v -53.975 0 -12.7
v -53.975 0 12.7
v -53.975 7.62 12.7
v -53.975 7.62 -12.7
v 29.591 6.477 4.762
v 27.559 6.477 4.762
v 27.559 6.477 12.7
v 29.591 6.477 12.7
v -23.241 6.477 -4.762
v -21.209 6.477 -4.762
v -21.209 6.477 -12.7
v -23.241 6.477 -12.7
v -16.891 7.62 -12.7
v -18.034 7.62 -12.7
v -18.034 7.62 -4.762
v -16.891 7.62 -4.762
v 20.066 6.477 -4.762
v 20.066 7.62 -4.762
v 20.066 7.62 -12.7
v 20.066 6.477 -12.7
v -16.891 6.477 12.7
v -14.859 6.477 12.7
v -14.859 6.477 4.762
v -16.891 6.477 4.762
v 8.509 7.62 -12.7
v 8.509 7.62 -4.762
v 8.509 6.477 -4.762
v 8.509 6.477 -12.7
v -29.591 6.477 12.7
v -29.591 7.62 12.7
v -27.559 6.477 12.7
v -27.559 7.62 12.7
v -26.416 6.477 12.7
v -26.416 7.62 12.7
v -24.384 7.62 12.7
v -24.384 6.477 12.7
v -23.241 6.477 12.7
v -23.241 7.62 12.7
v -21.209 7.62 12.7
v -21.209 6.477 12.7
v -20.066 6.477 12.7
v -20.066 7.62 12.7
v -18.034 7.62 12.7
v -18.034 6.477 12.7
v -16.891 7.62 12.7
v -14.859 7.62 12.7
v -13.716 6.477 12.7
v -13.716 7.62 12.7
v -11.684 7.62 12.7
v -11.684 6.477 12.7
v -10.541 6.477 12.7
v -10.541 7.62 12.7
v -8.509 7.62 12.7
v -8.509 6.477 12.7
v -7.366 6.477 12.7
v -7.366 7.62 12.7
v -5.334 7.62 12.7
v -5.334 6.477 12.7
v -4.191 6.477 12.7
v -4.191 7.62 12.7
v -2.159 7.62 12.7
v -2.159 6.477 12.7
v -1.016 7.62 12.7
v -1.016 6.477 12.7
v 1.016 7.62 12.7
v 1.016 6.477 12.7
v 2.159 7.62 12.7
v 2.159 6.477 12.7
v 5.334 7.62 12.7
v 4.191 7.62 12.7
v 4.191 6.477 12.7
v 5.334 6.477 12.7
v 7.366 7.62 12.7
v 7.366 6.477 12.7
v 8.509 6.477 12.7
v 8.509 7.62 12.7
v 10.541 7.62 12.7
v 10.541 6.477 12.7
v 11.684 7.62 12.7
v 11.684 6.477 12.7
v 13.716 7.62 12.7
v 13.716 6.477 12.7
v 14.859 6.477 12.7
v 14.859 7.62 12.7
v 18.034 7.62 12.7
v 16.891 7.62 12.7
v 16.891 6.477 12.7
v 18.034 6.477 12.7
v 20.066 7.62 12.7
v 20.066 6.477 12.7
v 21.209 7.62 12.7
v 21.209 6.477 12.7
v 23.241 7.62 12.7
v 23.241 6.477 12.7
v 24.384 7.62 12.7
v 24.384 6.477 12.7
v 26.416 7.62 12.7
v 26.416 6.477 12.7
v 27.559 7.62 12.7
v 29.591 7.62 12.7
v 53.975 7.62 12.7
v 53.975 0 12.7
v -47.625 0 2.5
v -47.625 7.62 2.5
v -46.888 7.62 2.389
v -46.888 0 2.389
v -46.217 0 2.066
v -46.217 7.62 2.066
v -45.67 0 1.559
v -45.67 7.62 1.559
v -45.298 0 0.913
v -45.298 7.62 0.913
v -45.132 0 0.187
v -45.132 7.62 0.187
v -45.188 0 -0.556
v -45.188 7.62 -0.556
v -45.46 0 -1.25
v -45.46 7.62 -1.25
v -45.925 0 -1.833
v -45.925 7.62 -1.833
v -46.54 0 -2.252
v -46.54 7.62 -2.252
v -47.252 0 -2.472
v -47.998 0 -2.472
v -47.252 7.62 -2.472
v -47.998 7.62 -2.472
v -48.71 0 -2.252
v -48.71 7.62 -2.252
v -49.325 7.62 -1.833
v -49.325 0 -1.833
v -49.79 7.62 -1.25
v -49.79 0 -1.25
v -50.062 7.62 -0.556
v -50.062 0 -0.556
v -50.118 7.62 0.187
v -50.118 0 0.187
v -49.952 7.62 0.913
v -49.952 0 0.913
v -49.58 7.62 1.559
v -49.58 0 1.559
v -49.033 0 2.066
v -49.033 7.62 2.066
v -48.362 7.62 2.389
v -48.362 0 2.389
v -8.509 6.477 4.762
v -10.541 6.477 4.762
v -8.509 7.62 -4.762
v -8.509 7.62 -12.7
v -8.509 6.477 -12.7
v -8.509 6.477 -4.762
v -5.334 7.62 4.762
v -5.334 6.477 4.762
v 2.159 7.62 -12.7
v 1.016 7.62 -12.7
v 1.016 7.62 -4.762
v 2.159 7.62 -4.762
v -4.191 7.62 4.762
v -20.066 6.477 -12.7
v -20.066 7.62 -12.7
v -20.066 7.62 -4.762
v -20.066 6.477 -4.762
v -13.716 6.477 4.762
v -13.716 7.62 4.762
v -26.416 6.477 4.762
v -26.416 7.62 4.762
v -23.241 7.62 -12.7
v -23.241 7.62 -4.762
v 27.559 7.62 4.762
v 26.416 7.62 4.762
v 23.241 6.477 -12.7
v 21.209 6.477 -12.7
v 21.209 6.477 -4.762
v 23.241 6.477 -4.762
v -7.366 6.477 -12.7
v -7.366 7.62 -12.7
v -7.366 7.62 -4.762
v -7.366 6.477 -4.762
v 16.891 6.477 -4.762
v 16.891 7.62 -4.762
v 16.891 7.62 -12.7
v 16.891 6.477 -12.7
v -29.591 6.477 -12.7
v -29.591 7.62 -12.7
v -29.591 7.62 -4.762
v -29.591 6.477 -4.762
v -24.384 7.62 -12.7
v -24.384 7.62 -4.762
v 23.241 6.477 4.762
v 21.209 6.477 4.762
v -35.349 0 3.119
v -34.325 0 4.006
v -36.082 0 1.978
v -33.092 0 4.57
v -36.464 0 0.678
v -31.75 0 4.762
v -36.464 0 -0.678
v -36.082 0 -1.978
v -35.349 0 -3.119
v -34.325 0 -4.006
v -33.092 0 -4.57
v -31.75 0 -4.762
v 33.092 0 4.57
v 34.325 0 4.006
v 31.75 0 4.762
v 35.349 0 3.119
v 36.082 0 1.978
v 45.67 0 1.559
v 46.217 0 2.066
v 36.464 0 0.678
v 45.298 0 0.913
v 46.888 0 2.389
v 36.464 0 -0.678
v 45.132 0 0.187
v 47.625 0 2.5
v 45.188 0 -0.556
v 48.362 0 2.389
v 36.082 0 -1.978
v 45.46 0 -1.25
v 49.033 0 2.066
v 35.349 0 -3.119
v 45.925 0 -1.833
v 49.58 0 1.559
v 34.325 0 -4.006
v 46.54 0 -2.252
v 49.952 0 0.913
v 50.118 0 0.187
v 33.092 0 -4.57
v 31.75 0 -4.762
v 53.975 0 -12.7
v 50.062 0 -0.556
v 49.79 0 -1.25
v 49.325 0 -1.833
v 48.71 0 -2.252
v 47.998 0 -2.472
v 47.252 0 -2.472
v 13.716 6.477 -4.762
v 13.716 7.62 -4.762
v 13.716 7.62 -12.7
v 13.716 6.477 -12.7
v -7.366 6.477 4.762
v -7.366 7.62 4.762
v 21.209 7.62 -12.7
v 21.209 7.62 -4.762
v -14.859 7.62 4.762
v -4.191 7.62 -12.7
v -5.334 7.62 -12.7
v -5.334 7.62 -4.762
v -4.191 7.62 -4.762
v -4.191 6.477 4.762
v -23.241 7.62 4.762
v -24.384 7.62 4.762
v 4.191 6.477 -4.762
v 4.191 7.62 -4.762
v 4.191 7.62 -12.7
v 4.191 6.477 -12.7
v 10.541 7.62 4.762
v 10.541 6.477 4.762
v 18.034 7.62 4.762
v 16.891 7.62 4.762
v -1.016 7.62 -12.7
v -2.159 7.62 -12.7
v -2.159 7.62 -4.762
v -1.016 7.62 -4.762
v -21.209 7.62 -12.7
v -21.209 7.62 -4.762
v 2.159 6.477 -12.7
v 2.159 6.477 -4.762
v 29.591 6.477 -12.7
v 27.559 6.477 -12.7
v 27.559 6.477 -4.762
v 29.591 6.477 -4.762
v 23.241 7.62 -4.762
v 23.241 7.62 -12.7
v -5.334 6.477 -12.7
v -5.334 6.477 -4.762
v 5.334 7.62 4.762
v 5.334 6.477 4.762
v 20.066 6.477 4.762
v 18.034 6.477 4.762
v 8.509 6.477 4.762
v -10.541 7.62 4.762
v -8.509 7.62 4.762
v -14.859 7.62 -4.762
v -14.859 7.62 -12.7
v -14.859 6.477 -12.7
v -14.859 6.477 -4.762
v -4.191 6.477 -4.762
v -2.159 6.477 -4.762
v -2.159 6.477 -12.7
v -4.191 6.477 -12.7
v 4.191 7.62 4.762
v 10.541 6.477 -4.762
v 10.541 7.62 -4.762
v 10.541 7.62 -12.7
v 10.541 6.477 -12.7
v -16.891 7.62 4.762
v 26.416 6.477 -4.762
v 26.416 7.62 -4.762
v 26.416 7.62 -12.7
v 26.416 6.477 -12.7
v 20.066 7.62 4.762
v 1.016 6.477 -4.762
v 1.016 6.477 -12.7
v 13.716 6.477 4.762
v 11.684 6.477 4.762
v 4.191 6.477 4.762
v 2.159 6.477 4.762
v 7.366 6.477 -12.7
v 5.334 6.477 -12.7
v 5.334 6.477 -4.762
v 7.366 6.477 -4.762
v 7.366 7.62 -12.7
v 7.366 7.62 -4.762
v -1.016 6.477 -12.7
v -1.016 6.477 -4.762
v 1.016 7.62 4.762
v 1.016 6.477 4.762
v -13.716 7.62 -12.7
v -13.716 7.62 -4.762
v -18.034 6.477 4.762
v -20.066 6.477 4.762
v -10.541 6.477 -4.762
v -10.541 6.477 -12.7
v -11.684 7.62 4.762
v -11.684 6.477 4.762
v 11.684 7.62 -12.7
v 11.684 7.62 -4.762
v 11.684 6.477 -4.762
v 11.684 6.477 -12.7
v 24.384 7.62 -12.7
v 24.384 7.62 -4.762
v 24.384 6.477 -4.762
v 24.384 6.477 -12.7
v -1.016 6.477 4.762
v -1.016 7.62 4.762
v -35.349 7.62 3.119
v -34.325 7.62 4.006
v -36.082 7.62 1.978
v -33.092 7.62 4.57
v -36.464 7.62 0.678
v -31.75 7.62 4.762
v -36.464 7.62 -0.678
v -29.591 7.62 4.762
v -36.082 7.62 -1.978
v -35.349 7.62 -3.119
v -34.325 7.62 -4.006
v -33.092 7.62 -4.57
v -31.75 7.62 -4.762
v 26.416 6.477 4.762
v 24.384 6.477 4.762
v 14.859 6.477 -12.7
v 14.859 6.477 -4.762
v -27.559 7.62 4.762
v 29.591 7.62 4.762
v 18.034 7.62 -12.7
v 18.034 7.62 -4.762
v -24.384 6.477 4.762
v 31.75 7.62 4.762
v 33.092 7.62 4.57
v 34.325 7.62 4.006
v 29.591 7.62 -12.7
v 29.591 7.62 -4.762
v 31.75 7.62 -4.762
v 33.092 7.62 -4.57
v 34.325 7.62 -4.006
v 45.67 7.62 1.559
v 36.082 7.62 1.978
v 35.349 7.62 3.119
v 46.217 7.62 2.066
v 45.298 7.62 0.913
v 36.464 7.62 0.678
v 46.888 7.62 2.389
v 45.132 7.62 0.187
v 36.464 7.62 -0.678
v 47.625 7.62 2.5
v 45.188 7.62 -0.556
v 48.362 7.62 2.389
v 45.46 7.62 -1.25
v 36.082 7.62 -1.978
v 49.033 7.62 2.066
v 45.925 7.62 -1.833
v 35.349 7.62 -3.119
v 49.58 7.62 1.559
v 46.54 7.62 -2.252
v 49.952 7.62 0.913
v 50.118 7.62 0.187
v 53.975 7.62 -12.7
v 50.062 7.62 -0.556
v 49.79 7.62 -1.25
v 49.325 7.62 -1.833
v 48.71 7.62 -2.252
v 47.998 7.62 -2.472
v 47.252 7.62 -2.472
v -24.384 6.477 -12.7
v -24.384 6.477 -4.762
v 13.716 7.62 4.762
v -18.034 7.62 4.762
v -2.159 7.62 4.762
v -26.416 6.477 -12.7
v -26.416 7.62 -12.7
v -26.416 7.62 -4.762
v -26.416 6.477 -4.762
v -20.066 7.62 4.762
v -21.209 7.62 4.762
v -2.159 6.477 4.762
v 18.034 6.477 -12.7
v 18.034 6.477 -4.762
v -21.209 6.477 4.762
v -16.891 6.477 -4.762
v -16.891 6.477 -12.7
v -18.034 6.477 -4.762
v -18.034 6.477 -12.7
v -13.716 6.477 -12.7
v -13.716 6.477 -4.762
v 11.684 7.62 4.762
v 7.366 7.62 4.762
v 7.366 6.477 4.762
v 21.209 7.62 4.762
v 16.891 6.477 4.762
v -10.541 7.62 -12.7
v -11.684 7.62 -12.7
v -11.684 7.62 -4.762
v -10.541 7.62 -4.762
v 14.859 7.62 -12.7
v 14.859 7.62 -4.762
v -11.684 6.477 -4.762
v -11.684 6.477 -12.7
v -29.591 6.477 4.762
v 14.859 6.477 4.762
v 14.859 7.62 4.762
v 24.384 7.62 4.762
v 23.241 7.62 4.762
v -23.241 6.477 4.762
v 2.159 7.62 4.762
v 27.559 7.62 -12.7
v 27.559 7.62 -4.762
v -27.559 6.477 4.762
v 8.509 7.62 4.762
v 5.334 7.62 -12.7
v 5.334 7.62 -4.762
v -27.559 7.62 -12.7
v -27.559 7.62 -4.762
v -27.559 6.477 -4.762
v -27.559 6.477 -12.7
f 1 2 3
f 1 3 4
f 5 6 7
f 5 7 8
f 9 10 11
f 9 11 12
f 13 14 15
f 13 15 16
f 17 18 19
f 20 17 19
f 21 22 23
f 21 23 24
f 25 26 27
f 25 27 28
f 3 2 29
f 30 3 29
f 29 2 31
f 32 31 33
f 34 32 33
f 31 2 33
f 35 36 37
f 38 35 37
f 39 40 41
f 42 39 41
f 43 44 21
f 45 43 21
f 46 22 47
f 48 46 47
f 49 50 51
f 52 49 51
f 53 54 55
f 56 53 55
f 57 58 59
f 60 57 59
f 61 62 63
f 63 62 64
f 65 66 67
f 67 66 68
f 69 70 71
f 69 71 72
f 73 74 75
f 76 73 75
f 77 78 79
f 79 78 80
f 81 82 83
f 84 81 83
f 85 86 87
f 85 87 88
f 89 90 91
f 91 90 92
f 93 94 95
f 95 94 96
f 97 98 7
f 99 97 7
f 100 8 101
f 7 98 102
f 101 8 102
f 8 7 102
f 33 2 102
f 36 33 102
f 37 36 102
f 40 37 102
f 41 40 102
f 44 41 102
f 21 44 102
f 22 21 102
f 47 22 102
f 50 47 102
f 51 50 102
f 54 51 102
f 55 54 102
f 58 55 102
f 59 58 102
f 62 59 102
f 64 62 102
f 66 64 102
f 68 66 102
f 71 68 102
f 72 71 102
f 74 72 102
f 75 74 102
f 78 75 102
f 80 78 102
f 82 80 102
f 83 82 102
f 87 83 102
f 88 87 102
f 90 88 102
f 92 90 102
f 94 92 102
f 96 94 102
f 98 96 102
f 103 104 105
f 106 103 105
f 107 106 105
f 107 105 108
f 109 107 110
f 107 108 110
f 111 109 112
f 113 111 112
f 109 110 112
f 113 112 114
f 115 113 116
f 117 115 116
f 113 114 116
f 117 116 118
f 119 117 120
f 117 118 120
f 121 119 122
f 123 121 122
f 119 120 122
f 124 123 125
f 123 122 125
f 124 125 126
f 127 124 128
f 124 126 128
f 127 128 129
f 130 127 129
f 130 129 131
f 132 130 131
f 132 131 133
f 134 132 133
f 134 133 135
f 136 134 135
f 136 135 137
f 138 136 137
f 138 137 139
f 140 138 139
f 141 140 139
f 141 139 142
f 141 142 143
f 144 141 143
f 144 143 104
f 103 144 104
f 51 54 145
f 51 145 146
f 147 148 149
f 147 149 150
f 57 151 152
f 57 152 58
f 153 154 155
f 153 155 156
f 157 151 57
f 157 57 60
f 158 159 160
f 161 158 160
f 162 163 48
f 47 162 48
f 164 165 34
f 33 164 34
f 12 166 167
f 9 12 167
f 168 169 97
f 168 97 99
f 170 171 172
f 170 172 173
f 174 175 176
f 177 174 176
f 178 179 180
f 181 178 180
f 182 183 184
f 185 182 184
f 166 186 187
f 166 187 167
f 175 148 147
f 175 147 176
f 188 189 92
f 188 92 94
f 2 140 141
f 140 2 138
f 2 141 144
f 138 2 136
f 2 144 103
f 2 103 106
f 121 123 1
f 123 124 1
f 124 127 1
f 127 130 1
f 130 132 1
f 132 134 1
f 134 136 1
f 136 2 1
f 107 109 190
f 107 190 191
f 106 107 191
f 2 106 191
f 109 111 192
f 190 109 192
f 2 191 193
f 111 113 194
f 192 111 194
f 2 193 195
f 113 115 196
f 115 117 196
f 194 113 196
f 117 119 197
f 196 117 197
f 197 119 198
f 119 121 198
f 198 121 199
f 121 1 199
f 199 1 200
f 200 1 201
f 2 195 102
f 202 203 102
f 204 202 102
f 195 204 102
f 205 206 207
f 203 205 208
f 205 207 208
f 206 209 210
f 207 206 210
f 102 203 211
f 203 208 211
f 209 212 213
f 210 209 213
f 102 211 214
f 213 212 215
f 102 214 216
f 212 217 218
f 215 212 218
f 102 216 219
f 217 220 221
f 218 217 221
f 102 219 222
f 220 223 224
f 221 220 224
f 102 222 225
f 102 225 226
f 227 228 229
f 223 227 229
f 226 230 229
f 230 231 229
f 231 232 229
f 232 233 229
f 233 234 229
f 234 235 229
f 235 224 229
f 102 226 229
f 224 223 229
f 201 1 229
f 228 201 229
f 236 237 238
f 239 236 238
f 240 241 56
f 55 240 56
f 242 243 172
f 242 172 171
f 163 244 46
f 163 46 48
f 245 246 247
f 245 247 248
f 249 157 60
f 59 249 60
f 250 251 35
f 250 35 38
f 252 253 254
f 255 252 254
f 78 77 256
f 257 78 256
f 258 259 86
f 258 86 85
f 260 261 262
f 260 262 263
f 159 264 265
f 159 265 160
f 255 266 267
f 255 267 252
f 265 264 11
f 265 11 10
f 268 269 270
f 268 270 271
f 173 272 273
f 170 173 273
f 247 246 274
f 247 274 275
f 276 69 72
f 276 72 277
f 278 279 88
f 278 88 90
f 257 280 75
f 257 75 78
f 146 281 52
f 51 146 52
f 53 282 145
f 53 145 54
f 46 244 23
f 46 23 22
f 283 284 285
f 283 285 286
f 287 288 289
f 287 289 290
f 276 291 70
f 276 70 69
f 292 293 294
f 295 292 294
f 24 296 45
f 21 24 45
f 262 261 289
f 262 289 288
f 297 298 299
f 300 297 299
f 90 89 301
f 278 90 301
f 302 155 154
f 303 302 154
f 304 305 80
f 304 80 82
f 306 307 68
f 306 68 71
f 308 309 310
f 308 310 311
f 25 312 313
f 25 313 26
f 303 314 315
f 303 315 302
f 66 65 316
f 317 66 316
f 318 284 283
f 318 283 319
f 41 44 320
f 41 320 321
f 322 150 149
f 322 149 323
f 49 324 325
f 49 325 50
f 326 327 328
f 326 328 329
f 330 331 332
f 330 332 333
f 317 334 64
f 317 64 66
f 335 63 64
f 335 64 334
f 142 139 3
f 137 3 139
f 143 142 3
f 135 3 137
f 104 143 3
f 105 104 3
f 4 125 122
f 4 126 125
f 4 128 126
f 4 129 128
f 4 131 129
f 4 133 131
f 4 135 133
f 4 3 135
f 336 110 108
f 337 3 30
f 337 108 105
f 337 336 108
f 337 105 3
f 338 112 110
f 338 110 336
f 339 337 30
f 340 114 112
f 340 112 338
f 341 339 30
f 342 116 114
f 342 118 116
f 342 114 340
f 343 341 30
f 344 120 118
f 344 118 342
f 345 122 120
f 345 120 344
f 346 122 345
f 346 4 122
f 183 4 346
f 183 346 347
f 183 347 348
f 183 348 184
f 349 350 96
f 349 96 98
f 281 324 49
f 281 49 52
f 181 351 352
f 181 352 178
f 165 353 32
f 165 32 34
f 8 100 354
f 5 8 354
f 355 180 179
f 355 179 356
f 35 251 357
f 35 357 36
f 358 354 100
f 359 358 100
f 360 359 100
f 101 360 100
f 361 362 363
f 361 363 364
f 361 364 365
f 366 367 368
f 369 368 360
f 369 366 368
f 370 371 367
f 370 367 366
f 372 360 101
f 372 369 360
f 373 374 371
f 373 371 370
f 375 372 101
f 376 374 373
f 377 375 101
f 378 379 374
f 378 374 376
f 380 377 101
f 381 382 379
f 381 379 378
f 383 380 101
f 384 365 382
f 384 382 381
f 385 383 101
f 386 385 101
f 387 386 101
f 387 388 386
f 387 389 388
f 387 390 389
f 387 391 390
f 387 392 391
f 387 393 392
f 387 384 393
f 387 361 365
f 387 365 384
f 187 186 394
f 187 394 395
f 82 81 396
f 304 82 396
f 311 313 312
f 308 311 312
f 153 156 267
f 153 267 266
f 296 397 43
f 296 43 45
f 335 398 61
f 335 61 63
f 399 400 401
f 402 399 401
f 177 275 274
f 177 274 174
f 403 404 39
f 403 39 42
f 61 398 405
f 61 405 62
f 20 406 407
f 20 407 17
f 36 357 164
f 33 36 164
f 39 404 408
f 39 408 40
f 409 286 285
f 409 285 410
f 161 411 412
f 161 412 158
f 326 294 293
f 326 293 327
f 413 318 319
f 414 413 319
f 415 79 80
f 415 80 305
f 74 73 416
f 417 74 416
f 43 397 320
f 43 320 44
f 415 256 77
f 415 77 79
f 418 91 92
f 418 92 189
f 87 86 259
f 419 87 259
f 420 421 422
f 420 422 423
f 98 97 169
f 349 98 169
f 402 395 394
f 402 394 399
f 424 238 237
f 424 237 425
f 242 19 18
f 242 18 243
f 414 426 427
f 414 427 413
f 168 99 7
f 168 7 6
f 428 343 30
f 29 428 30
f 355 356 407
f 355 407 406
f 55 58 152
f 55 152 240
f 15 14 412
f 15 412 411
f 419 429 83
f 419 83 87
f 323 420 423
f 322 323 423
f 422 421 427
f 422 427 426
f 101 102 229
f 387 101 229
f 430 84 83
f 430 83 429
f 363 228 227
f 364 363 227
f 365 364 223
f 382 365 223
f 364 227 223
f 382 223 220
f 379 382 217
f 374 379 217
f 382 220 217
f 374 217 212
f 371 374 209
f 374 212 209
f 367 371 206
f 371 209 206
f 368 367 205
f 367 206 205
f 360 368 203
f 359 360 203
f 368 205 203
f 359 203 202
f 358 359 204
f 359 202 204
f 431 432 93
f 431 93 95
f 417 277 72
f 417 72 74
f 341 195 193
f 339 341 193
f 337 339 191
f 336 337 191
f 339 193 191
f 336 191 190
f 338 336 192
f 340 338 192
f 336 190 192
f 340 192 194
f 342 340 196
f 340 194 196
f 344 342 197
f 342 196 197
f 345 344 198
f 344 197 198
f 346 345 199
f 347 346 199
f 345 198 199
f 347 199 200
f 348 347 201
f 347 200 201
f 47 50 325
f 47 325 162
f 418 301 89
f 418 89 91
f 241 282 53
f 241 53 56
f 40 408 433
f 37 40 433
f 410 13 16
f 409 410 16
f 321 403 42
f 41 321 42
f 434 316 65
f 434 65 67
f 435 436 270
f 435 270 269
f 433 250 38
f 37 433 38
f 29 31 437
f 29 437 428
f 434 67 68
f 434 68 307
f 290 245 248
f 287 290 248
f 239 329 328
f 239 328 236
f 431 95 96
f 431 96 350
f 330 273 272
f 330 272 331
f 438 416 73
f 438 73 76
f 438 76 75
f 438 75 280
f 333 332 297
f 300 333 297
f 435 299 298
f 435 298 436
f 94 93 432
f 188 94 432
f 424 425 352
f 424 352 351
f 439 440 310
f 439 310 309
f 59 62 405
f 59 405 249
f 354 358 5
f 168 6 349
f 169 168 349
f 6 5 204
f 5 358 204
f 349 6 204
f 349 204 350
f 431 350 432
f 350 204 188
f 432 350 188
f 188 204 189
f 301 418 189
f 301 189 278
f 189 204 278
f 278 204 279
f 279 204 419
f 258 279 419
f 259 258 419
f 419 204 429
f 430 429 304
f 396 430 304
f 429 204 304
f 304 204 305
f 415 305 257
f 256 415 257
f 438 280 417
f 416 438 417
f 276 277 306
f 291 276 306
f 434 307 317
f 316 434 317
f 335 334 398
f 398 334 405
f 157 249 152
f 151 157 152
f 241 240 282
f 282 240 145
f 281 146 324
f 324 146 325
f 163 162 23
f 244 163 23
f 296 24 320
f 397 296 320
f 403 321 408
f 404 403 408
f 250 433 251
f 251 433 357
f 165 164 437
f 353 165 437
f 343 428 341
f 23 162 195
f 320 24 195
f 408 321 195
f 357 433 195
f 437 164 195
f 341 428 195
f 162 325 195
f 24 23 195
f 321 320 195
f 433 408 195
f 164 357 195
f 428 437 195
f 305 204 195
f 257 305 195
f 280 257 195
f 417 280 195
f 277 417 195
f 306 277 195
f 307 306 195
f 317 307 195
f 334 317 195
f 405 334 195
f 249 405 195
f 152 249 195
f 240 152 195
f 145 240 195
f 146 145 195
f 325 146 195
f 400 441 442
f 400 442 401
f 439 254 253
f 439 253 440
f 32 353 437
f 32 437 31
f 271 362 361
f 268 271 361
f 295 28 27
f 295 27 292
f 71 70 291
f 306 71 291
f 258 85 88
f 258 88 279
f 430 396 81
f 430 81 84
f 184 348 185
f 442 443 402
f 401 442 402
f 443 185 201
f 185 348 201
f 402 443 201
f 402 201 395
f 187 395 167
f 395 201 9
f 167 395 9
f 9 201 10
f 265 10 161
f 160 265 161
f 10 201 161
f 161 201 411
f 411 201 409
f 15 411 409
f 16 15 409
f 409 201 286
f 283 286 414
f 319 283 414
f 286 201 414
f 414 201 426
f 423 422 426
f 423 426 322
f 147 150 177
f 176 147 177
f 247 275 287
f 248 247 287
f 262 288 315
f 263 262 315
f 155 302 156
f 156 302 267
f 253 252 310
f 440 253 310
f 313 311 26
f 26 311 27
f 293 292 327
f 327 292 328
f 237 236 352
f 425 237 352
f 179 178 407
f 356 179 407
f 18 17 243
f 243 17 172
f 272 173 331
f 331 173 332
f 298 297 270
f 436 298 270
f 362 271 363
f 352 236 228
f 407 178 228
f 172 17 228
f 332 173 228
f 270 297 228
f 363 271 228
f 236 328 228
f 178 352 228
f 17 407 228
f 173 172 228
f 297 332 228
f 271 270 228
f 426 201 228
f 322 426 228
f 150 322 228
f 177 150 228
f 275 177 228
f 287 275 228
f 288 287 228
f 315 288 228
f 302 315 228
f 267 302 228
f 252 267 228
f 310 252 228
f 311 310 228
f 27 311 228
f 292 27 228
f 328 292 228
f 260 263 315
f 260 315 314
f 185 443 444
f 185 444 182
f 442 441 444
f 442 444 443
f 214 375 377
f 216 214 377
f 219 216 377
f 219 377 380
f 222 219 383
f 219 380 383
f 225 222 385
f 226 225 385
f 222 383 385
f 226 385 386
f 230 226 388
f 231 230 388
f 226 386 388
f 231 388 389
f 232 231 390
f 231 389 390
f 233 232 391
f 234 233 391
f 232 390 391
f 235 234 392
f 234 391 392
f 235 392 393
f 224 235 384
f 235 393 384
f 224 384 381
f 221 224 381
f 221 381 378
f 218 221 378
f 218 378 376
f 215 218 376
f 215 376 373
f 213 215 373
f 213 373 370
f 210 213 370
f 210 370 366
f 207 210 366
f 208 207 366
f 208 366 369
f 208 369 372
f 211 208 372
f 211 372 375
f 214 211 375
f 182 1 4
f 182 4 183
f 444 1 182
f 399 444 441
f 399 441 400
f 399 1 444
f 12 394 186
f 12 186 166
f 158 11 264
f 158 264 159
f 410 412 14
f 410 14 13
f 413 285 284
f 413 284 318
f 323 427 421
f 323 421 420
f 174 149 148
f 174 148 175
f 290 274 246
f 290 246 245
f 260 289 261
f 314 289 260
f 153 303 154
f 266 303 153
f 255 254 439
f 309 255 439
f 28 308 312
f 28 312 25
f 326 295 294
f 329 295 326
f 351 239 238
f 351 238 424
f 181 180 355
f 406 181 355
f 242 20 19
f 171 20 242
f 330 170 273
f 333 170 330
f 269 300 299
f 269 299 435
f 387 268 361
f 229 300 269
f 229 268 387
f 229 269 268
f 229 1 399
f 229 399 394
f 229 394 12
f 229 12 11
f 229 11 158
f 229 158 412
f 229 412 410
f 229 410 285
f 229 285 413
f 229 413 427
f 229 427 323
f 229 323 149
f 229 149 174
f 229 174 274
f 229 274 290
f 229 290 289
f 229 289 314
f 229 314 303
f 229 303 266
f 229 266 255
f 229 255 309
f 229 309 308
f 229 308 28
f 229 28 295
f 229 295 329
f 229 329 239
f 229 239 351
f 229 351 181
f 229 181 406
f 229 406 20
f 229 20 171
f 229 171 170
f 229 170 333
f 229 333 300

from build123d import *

# Parameters (mm, degrees)
SKETCH1_W                = 107.95
SKETCH1_H                = 25.4
BOSS_EXTRUDE1_DEPTH      = 7.62
SKETCH2_W                = 2.032
SKETCH2_H                = 25.4
CUT_EXTRUDE1_DEPTH       = 1.143
LPATTERN1_COUNT          = 10
LPATTERN1_PITCH          = 3.175
MIRROR1_COPY_1_SKETCH_W  = 2.032
MIRROR1_COPY_1_SKETCH_H  = 25.4
MIRROR1_COPY_1_DEPTH     = 1.143
MIRROR1_COPY_2_SKETCH_W  = 2.032
MIRROR1_COPY_2_SKETCH_H  = 25.4
MIRROR1_COPY_2_DEPTH     = 1.143
MIRROR1_COPY_3_SKETCH_W  = 2.032
MIRROR1_COPY_3_SKETCH_H  = 25.4
MIRROR1_COPY_3_DEPTH     = 1.143
MIRROR1_COPY_4_SKETCH_W  = 2.032
MIRROR1_COPY_4_SKETCH_H  = 25.4
MIRROR1_COPY_4_DEPTH     = 1.143
MIRROR1_COPY_5_SKETCH_W  = 2.032
MIRROR1_COPY_5_SKETCH_H  = 25.4
MIRROR1_COPY_5_DEPTH     = 1.143
MIRROR1_COPY_6_SKETCH_W  = 2.032
MIRROR1_COPY_6_SKETCH_H  = 25.4
MIRROR1_COPY_6_DEPTH     = 1.143
MIRROR1_COPY_7_SKETCH_W  = 2.032
MIRROR1_COPY_7_SKETCH_H  = 25.4
MIRROR1_COPY_7_DEPTH     = 1.143
MIRROR1_COPY_8_SKETCH_W  = 2.032
MIRROR1_COPY_8_SKETCH_H  = 25.4
MIRROR1_COPY_8_DEPTH     = 1.143
MIRROR1_COPY_9_SKETCH_W  = 2.032
MIRROR1_COPY_9_SKETCH_H  = 25.4
MIRROR1_COPY_9_DEPTH     = 1.143
MIRROR1_COPY_10_SKETCH_W = 2.032
MIRROR1_COPY_10_SKETCH_H = 25.4
MIRROR1_COPY_10_DEPTH    = 1.143
SKETCH3_R                = 2.499995
CUT_EXTRUDE2_DEPTH       = 56.970126184


with BuildPart() as part:
    # Sketch1 → Boss-Extrude1 (new body)
    with BuildSketch(Plane(origin=(0, 0, 0), x_dir=(1, 0, 0), z_dir=(0, 1, 0))):
        Rectangle(SKETCH1_W, SKETCH1_H)
        with BuildLine():
            Line((-31.75, 4.7625), (31.75, 4.7625))
            ThreePointArc((31.75, 4.7625), (36.5125, 0), (31.75, -4.7625))
            Line((31.75, -4.7625), (-31.75, -4.7625))
            ThreePointArc((-31.75, -4.7625), (-36.5125, 0), (-31.75, 4.7625))
        make_face(mode=Mode.SUBTRACT)
    extrude(amount=BOSS_EXTRUDE1_DEPTH)

    # Sketch2 → Cut-Extrude1 (cut)
    with BuildSketch(Plane(origin=(0, 7.62, 0), x_dir=(1, 0, 0), z_dir=(0, 1, 0))):
        Rectangle(SKETCH2_W, SKETCH2_H)
    cut_extrude1 = extrude(amount=-CUT_EXTRUDE1_DEPTH, mode=Mode.SUBTRACT)

    # LPattern1: Cut-Extrude1 ×10
    with Locations(*[(i * LPATTERN1_PITCH, 0, 0) for i in range(1, LPATTERN1_COUNT)]):
        add(cut_extrude1, mode=Mode.SUBTRACT)

    # Mirror1 copy 1 sketch → Mirror1 copy 1 (cut)
    with BuildSketch(Plane(origin=(-3.175, 7.62, 0), x_dir=(-1, 0, 0), z_dir=(0, 1, 0))):
        Rectangle(MIRROR1_COPY_1_SKETCH_W, MIRROR1_COPY_1_SKETCH_H)
    extrude(amount=-MIRROR1_COPY_1_DEPTH, mode=Mode.SUBTRACT)

    # Mirror1 copy 2 sketch → Mirror1 copy 2 (cut)
    with BuildSketch(Plane(origin=(-6.35, 7.62, 0), x_dir=(-1, 0, 0), z_dir=(0, 1, 0))):
        Rectangle(MIRROR1_COPY_2_SKETCH_W, MIRROR1_COPY_2_SKETCH_H)
    extrude(amount=-MIRROR1_COPY_2_DEPTH, mode=Mode.SUBTRACT)

    # Mirror1 copy 3 sketch → Mirror1 copy 3 (cut)
    with BuildSketch(Plane(origin=(-9.525, 7.62, 0), x_dir=(-1, 0, 0), z_dir=(0, 1, 0))):
        Rectangle(MIRROR1_COPY_3_SKETCH_W, MIRROR1_COPY_3_SKETCH_H)
    extrude(amount=-MIRROR1_COPY_3_DEPTH, mode=Mode.SUBTRACT)

    # Mirror1 copy 4 sketch → Mirror1 copy 4 (cut)
    with BuildSketch(Plane(origin=(-12.7, 7.62, 0), x_dir=(-1, 0, 0), z_dir=(0, 1, 0))):
        Rectangle(MIRROR1_COPY_4_SKETCH_W, MIRROR1_COPY_4_SKETCH_H)
    extrude(amount=-MIRROR1_COPY_4_DEPTH, mode=Mode.SUBTRACT)

    # Mirror1 copy 5 sketch → Mirror1 copy 5 (cut)
    with BuildSketch(Plane(origin=(-15.875, 7.62, 0), x_dir=(-1, 0, 0), z_dir=(0, 1, 0))):
        Rectangle(MIRROR1_COPY_5_SKETCH_W, MIRROR1_COPY_5_SKETCH_H)
    extrude(amount=-MIRROR1_COPY_5_DEPTH, mode=Mode.SUBTRACT)

    # Mirror1 copy 6 sketch → Mirror1 copy 6 (cut)
    with BuildSketch(Plane(origin=(-19.05, 7.62, 0), x_dir=(-1, 0, 0), z_dir=(0, 1, 0))):
        Rectangle(MIRROR1_COPY_6_SKETCH_W, MIRROR1_COPY_6_SKETCH_H)
    extrude(amount=-MIRROR1_COPY_6_DEPTH, mode=Mode.SUBTRACT)

    # Mirror1 copy 7 sketch → Mirror1 copy 7 (cut)
    with BuildSketch(Plane(origin=(-22.225, 7.62, 0), x_dir=(-1, 0, 0), z_dir=(0, 1, 0))):
        Rectangle(MIRROR1_COPY_7_SKETCH_W, MIRROR1_COPY_7_SKETCH_H)
    extrude(amount=-MIRROR1_COPY_7_DEPTH, mode=Mode.SUBTRACT)

    # Mirror1 copy 8 sketch → Mirror1 copy 8 (cut)
    with BuildSketch(Plane(origin=(-25.4, 7.62, 0), x_dir=(-1, 0, 0), z_dir=(0, 1, 0))):
        Rectangle(MIRROR1_COPY_8_SKETCH_W, MIRROR1_COPY_8_SKETCH_H)
    extrude(amount=-MIRROR1_COPY_8_DEPTH, mode=Mode.SUBTRACT)

    # Mirror1 copy 9 sketch → Mirror1 copy 9 (cut)
    with BuildSketch(Plane(origin=(-28.575, 7.62, 0), x_dir=(-1, 0, 0), z_dir=(0, 1, 0))):
        Rectangle(MIRROR1_COPY_9_SKETCH_W, MIRROR1_COPY_9_SKETCH_H)
    extrude(amount=-MIRROR1_COPY_9_DEPTH, mode=Mode.SUBTRACT)

    # Mirror1 copy 10 sketch → Mirror1 copy 10 (cut)
    with BuildSketch(Plane(origin=(0, 7.62, 0), x_dir=(-1, 0, 0), z_dir=(0, 1, 0))):
        Rectangle(MIRROR1_COPY_10_SKETCH_W, MIRROR1_COPY_10_SKETCH_H)
    extrude(amount=-MIRROR1_COPY_10_DEPTH, mode=Mode.SUBTRACT)

    # Sketch3 → Cut-Extrude2 (cut, through all)
    with BuildSketch(Plane(origin=(0, 7.62, 0), x_dir=(1, 0, 0), z_dir=(0, 1, 0))):
        with Locations(Location((-47.625, 0, 0), (0, 0, 270))):
            Circle(SKETCH3_R)
        with Locations(Location((47.625, 0, 0), (0, 0, 270))):
            Circle(SKETCH3_R)
    extrude(amount=-CUT_EXTRUDE2_DEPTH, mode=Mode.SUBTRACT)


solid = part.part
